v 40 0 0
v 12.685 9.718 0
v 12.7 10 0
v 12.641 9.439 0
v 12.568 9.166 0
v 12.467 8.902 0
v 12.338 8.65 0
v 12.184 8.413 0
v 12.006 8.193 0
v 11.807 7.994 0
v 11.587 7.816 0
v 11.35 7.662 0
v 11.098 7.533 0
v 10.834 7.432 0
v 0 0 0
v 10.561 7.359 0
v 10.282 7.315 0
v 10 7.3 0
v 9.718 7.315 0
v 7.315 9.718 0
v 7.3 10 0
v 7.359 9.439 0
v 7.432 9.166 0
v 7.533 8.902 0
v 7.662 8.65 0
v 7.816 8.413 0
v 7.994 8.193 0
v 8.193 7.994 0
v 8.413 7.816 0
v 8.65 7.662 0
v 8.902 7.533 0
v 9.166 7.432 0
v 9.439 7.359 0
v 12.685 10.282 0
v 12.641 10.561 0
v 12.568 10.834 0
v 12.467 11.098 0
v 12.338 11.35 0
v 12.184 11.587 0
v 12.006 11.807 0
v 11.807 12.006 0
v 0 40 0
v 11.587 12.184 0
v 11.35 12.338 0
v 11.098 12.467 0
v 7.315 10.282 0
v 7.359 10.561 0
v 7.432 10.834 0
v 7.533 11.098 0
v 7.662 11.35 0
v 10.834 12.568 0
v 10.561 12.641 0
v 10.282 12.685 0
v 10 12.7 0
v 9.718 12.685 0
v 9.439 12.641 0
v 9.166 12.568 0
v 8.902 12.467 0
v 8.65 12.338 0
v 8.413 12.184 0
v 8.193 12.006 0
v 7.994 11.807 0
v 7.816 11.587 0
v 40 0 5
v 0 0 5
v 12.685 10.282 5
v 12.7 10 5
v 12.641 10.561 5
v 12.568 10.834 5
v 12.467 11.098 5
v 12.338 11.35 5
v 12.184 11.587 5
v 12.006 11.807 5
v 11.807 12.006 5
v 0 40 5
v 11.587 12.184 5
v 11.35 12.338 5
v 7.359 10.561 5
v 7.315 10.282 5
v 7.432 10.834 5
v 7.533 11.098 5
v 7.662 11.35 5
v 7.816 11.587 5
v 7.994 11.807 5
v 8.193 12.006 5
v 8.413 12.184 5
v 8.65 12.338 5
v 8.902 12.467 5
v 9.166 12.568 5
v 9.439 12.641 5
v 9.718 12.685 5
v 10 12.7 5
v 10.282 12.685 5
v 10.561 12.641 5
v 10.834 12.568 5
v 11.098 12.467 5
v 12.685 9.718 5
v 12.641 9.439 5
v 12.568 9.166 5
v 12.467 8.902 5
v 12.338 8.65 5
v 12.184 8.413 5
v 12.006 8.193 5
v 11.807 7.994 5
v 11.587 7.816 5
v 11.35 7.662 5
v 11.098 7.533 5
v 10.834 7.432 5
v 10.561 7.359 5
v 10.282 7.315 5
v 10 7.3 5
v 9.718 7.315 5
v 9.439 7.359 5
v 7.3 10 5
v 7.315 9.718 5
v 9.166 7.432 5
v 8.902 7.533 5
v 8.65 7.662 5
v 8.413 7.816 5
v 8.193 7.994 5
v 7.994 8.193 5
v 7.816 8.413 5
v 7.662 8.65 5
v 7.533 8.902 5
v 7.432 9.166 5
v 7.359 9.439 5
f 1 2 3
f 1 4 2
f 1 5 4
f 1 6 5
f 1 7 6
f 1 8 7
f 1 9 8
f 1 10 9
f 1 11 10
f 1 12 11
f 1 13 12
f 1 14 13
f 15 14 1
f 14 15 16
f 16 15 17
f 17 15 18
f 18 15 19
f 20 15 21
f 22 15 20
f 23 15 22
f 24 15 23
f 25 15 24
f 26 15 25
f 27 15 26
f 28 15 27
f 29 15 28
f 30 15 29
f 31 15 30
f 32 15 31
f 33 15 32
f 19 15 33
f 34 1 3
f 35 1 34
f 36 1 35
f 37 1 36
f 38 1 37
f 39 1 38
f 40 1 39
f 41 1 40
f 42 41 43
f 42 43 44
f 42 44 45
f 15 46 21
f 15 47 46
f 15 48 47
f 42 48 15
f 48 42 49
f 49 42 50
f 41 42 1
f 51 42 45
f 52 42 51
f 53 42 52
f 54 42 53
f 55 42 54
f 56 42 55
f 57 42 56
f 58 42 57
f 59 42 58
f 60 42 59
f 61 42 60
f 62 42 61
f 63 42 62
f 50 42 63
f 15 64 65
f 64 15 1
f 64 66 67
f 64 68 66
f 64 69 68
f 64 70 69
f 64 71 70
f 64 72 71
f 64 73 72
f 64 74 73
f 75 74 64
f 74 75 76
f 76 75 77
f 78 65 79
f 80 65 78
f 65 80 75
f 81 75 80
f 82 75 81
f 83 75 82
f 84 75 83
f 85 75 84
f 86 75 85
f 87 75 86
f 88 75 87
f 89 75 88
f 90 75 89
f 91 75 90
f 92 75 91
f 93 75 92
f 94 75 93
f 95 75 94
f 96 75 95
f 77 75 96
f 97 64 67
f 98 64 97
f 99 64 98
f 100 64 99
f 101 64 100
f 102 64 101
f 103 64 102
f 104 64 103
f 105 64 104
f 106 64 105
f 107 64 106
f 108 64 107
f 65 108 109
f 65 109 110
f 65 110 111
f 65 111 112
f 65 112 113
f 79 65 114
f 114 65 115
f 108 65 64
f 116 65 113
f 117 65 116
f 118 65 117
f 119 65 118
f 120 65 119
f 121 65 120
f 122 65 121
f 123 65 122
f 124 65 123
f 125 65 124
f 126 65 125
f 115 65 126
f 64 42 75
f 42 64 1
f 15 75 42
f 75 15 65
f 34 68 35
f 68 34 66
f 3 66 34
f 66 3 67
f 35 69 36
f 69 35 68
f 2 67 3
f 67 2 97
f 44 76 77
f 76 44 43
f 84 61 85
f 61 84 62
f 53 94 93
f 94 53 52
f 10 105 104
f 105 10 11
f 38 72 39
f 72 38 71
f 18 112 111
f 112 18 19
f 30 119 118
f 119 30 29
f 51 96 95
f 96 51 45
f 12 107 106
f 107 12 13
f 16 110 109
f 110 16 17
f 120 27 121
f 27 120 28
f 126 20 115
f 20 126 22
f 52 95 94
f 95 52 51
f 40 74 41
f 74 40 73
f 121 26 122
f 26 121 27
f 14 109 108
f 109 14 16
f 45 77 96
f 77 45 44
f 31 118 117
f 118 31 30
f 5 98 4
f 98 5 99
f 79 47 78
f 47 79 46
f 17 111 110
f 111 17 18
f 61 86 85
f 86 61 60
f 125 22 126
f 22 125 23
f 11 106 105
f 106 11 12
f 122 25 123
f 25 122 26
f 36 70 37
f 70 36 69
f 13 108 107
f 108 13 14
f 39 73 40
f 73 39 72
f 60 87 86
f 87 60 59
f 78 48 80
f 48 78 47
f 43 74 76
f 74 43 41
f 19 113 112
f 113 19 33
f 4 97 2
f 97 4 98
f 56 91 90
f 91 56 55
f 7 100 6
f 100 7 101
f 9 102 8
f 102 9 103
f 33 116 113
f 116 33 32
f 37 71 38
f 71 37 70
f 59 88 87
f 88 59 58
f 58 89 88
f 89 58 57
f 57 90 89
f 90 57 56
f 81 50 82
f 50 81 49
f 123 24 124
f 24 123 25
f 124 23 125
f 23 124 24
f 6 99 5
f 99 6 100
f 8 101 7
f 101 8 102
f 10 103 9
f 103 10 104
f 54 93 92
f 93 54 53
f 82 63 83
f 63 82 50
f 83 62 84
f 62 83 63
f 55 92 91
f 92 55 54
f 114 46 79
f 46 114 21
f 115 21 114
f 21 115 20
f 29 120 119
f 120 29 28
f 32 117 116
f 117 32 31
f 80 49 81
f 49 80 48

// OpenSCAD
// Triangular reinforcement gusset.
$fn = 60;
eps = 0.02;
leg = 40;
thickness = 5;
difference() {
    linear_extrude(height=thickness) polygon(points=[[0,0],[leg,0],[0,leg]]);
    translate([leg*0.25,leg*0.25,-eps]) cylinder(d=5.4,h=thickness+2*eps);
}
